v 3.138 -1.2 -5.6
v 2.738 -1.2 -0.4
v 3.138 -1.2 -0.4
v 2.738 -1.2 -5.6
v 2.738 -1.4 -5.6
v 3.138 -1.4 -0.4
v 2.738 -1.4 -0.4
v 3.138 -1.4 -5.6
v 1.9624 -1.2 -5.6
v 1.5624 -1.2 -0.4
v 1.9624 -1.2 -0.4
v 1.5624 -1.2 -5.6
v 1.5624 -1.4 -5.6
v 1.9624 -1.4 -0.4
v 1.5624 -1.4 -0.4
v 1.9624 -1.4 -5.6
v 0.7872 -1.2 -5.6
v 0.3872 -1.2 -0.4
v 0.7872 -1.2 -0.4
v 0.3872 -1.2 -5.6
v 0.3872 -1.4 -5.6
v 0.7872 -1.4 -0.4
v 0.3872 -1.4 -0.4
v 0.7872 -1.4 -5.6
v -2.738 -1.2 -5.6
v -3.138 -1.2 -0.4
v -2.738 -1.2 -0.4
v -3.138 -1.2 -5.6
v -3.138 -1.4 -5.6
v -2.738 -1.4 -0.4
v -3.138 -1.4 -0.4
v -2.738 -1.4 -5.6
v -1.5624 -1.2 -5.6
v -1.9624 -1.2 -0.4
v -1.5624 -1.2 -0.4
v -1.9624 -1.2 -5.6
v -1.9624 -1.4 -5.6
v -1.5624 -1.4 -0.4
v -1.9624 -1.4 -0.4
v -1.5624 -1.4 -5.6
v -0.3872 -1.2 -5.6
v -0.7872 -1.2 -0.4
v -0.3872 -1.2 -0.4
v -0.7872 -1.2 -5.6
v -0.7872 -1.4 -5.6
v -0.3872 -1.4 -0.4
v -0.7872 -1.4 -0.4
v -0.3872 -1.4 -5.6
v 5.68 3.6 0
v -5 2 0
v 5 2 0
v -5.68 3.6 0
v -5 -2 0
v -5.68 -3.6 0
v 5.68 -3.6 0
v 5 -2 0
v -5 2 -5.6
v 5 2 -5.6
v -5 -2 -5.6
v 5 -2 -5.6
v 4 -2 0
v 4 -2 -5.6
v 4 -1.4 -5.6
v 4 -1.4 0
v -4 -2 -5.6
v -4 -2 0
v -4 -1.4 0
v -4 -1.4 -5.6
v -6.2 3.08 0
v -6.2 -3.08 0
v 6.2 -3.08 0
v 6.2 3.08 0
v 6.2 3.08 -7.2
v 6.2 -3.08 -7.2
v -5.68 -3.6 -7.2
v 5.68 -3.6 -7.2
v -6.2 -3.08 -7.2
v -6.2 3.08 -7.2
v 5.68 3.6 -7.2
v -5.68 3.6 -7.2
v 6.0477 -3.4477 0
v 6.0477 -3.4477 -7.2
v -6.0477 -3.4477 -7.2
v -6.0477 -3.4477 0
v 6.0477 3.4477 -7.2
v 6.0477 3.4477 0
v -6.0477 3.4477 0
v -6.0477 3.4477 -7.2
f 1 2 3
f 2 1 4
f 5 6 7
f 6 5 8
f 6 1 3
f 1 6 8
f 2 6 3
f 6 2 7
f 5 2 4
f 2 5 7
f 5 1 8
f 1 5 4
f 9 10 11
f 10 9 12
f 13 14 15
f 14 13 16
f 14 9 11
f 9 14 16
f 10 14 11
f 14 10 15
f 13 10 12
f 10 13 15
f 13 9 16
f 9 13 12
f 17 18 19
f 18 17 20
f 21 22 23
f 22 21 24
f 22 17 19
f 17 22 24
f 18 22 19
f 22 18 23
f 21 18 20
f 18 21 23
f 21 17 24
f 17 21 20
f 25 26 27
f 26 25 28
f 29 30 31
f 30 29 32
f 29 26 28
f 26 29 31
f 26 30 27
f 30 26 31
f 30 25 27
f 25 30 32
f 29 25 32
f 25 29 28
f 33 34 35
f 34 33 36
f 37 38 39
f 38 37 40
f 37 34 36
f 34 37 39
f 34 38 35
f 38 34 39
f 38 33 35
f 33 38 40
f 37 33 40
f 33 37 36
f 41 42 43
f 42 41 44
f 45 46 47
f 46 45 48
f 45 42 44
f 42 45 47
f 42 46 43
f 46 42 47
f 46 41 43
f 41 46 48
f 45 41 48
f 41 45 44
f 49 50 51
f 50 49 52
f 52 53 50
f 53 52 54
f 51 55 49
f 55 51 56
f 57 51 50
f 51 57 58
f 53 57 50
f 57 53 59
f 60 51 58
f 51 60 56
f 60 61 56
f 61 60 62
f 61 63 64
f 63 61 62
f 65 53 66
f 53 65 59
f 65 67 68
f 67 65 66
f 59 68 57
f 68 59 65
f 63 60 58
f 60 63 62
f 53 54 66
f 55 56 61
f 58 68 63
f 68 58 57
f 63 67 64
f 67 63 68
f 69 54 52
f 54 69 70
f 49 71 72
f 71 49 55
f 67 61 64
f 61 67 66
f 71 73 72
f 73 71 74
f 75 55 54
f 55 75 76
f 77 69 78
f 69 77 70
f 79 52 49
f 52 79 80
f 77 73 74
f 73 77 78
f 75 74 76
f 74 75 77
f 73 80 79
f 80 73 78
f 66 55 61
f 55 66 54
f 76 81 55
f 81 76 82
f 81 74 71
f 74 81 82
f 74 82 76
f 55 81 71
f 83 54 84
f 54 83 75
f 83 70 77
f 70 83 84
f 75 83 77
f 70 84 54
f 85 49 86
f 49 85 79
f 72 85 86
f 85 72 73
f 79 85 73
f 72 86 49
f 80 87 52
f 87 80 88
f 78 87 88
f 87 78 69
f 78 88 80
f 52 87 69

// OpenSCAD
// file: ../p/8/1-4edge.scad
use <../../lib.scad>
function ldraw_lib__8__1_4edge() = [
// 0 Circle 0.25
// 0 Name: 8\1-4edge.dat
// 0 Author: Philippe Hurbain [Philo]
// 0 !LDRAW_ORG 8_Primitive UPDATE 2016-01
// 0 !LICENSE Licensed under CC BY 4.0 : see CAreadme.txt
// 
// 0 BFC CERTIFY CCW
  [0,"BFC","CERTIFY"],
  [0,"BFC","CCW"],
// 
// 0 !HISTORY 2016-12-31 [PTadmin] Official Update 2016-01
// 
// 
// 2 24 1 0 0 0.7071 0 0.7071
  [2,24,1,0,0,0.7071,0,0.7071],
// 2 24 0.7071 0 0.7071 0 0 1
  [2,24,0.7071,0,0.7071,0,0,1],
// 0 // Build by Primitive Generator 2
];
module ldraw_lib__8__1_4edge(step=0, col=false, unit=2/5, alt=false, line=0.2, solid=!$preview)
    makepoly(ldraw_lib__8__1_4edge(), step=step, col=col, unit=unit, alt=alt, line=line, solid=solid);
ldraw_lib__8__1_4edge(line=0.2);
// file: ../p/8/1-4cyli.scad
use <../../lib.scad>
function ldraw_lib__8__1_4cyli() = [
// 0 Cylinder 0.25
// 0 Name: 8\1-4cyli.dat
// 0 Author: Philippe Hurbain [Philo]
// 0 !LDRAW_ORG 8_Primitive UPDATE 2016-01
// 0 !LICENSE Licensed under CC BY 4.0 : see CAreadme.txt
// 
// 0 BFC CERTIFY CCW
  [0,"BFC","CERTIFY"],
  [0,"BFC","CCW"],
// 
// 0 !HISTORY 2016-12-31 [PTadmin] Official Update 2016-01
// 
// 
// 4 16 0.7071 0 0.7071 1 0 0 1 1 0 0.7071 1 0.7071
  [4,16,0.7071,0,0.7071,1,0,0,1,1,0,0.7071,1,0.7071],
// 4 16 0 0 1 0.7071 0 0.7071 0.7071 1 0.7071 0 1 1
  [4,16,0,0,1,0.7071,0,0.7071,0.7071,1,0.7071,0,1,1],
// 0 // conditional lines
// 5 24 1 1 0 1 0 0 1 1 -1 0.7071 1 0.7071
  [5,24,1,1,0,1,0,0,1,1,-1,0.7071,1,0.7071],
// 5 24 0.7071 1 0.7071 0.7071 0 0.7071 1 1 0 0 1 1
  [5,24,0.7071,1,0.7071,0.7071,0,0.7071,1,1,0,0,1,1],
// 5 24 0 1 1 0 0 1 0.7071 1 0.7071 -1 1 1
  [5,24,0,1,1,0,0,1,0.7071,1,0.7071,-1,1,1],
// 0 // Build by Primitive Generator 2
];
module ldraw_lib__8__1_4cyli(step=0, col=false, unit=2/5, alt=false, line=0.2, solid=!$preview)
    makepoly(ldraw_lib__8__1_4cyli(), step=step, col=col, unit=unit, alt=alt, line=line, solid=solid);
ldraw_lib__8__1_4cyli(line=0.2);
// file: ../p/rect2p.scad
use <../lib.scad>
function ldraw_lib__rect2p() = [
// 0 Rectangle with 2 Parallel Edges
// 0 Name: rect2p.dat
// 0 Author: Donald Sutter [technog]
// 0 !LDRAW_ORG Primitive UPDATE 2010-01
// 0 !LICENSE Licensed under CC BY 4.0 : see CAreadme.txt
// 
// 0 BFC CERTIFY CCW
  [0,"BFC","CERTIFY"],
  [0,"BFC","CCW"],
// 
// 0 !HISTORY 2003-08-01 [PTadmin] Official Update 2003-02
// 0 !HISTORY 2007-06-24 [PTadmin] Header formatted for Contributor Agreement
// 0 !HISTORY 2008-07-01 [PTadmin] Official Update 2008-01
// 0 !HISTORY 2010-01-17 [mikeheide] changed winding to CCW
// 0 !HISTORY 2010-04-05 [PTadmin] Official Update 2010-01
// 
// 
// 2 24 1 0 1 -1 0 1
  [2,24,1,0,1,-1,0,1],
// 2 24 -1 0 -1 1 0 -1
  [2,24,-1,0,-1,1,0,-1],
// 4 16 -1 0 1 -1 0 -1 1 0 -1 1 0 1
  [4,16,-1,0,1,-1,0,-1,1,0,-1,1,0,1],
// 0
];
module ldraw_lib__rect2p(step=0, col=false, unit=2/5, alt=false, line=0.2, solid=!$preview)
    makepoly(ldraw_lib__rect2p(), step=step, col=col, unit=unit, alt=alt, line=line, solid=solid);
ldraw_lib__rect2p(line=0.2);
// file: ../p/box3u2p.scad
use <../lib.scad>
function ldraw_lib__box3u2p() = [
// 0 Box with 3 Faces without 2 Parallel Edges
// 0 Name: box3u2p.dat
// 0 Author: Niels Karsdorp [nielsk]
// 0 !LDRAW_ORG Primitive UPDATE 2012-01
// 0 !LICENSE Licensed under CC BY 4.0 : see CAreadme.txt
// 
// 0 BFC CERTIFY CCW
  [0,"BFC","CERTIFY"],
  [0,"BFC","CCW"],
// 
// 0 !HISTORY 2003-03-12 [PTadmin] Official Update 2003-01
// 0 !HISTORY 2007-06-24 [PTadmin] Header formatted for Contributor Agreement
// 0 !HISTORY 2008-07-01 [PTadmin] Official Update 2008-01
// 0 !HISTORY 2012-02-16 [Philo] Changed to CCW
// 0 !HISTORY 2012-03-30 [PTadmin] Official Update 2012-01
// 
// 
// 2 24 1 1 1 -1 1 1
  [2,24,1,1,1,-1,1,1],
// 2 24 -1 1 -1 1 1 -1
  [2,24,-1,1,-1,1,1,-1],
// 2 24 1 0 1 -1 0 1
  [2,24,1,0,1,-1,0,1],
// 2 24 -1 0 -1 1 0 -1
  [2,24,-1,0,-1,1,0,-1],
// 2 24 1 1 1 1 1 -1
  [2,24,1,1,1,1,1,-1],
// 2 24 -1 1 1 -1 1 -1
  [2,24,-1,1,1,-1,1,-1],
// 2 24 1 1 1 1 0 1
  [2,24,1,1,1,1,0,1],
// 2 24 1 1 -1 1 0 -1
  [2,24,1,1,-1,1,0,-1],
// 2 24 -1 1 1 -1 0 1
  [2,24,-1,1,1,-1,0,1],
// 2 24 -1 1 -1 -1 0 -1
  [2,24,-1,1,-1,-1,0,-1],
// 4 16 -1 1 -1 -1 1 1 1 1 1 1 1 -1
  [4,16,-1,1,-1,-1,1,1,1,1,1,1,1,-1],
// 4 16 -1 1 1 -1 0 1 1 0 1 1 1 1
  [4,16,-1,1,1,-1,0,1,1,0,1,1,1,1],
// 4 16 1 1 -1 1 0 -1 -1 0 -1 -1 1 -1
  [4,16,1,1,-1,1,0,-1,-1,0,-1,-1,1,-1],
];
module ldraw_lib__box3u2p(step=0, col=false, unit=2/5, alt=false, line=0.2, solid=!$preview)
    makepoly(ldraw_lib__box3u2p(), step=step, col=col, unit=unit, alt=alt, line=line, solid=solid);
ldraw_lib__box3u2p(line=0.2);
// file: ../p/box2-5.scad
use <../lib.scad>
function ldraw_lib__box2_5() = [
// 0 Box with 2 Faces without 5 Edges
// 0 Name: box2-5.dat
// 0 Author: Steffen [Steffen]
// 0 !LDRAW_ORG Primitive UPDATE 2003-03
// 0 !LICENSE Licensed under CC BY 4.0 : see CAreadme.txt
// 
// 0 BFC CERTIFY CCW
  [0,"BFC","CERTIFY"],
  [0,"BFC","CCW"],
// 
// 0 !HISTORY 2003-12-19 [PTadmin] Official Update 2003-03
// 0 !HISTORY 2007-06-24 [PTadmin] Header formatted for Contributor Agreement
// 0 !HISTORY 2008-07-01 [PTadmin] Official Update 2008-01
// 
// 
// 2 24 1 1 1 -1 1 1
  [2,24,1,1,1,-1,1,1],
// 2 24 1 1 -1 -1 1 -1
  [2,24,1,1,-1,-1,1,-1],
// 2 24 1 -1 1 -1 -1 1
  [2,24,1,-1,1,-1,-1,1],
// 2 24 -1 -1 1 -1 1 1
  [2,24,-1,-1,1,-1,1,1],
// 2 24 1 -1 1 1 1 1
  [2,24,1,-1,1,1,1,1],
// 2 24 -1 1 -1 -1 1 1
  [2,24,-1,1,-1,-1,1,1],
// 2 24 1 1 -1 1 1 1
  [2,24,1,1,-1,1,1,1],
// 4 16 1 1 1 1 1 -1 -1 1 -1 -1 1 1
  [4,16,1,1,1,1,1,-1,-1,1,-1,-1,1,1],
// 4 16 1 1 1 -1 1 1 -1 -1 1 1 -1 1
  [4,16,1,1,1,-1,1,1,-1,-1,1,1,-1,1],
// 0
];
module ldraw_lib__box2_5(step=0, col=false, unit=2/5, alt=false, line=0.2, solid=!$preview)
    makepoly(ldraw_lib__box2_5(), step=step, col=col, unit=unit, alt=alt, line=line, solid=solid);
ldraw_lib__box2_5(line=0.2);
// file: ../p/box.scad
use <../lib.scad>
function ldraw_lib__box() = [
// 0 Box 6 (six faces)
// 0 Name: box.dat
// 0 Author: James Jessiman
// 0 !LDRAW_ORG Primitive UPDATE 2002-05
// 0 !LICENSE Licensed under CC BY 4.0 : see CAreadme.txt
// 
// 0 BFC CERTIFY CCW
  [0,"BFC","CERTIFY"],
  [0,"BFC","CCW"],
// 
// 0 !HISTORY 2002-08-22 [sbliss] Applied BFC
// 0 !HISTORY 2002-11-30 [PTadmin] Official Update 2002-05
// 0 !HISTORY 2007-06-24 [PTadmin] Header formatted for Contributor Agreement
// 0 !HISTORY 2008-07-01 [PTadmin] Official Update 2008-01
// 
// 
// 2 24 1 1 1 -1 1 1
  [2,24,1,1,1,-1,1,1],
// 2 24 -1 1 1 -1 1 -1
  [2,24,-1,1,1,-1,1,-1],
// 2 24 -1 1 -1 1 1 -1
  [2,24,-1,1,-1,1,1,-1],
// 2 24 1 1 -1 1 1 1
  [2,24,1,1,-1,1,1,1],
// 2 24 1 -1 1 -1 -1 1
  [2,24,1,-1,1,-1,-1,1],
// 2 24 -1 -1 1 -1 -1 -1
  [2,24,-1,-1,1,-1,-1,-1],
// 2 24 -1 -1 -1 1 -1 -1
  [2,24,-1,-1,-1,1,-1,-1],
// 2 24 1 -1 -1 1 -1 1
  [2,24,1,-1,-1,1,-1,1],
// 2 24 1 -1 1 1 1 1
  [2,24,1,-1,1,1,1,1],
// 2 24 -1 -1 1 -1 1 1
  [2,24,-1,-1,1,-1,1,1],
// 2 24 1 -1 -1 1 1 -1
  [2,24,1,-1,-1,1,1,-1],
// 2 24 -1 -1 -1 -1 1 -1
  [2,24,-1,-1,-1,-1,1,-1],
// 4 16 1 1 1 1 1 -1 -1 1 -1 -1 1 1
  [4,16,1,1,1,1,1,-1,-1,1,-1,-1,1,1],
// 4 16 -1 -1 -1 1 -1 -1 1 -1 1 -1 -1 1
  [4,16,-1,-1,-1,1,-1,-1,1,-1,1,-1,-1,1],
// 4 16 -1 -1 1 1 -1 1 1 1 1 -1 1 1
  [4,16,-1,-1,1,1,-1,1,1,1,1,-1,1,1],
// 4 16 -1 -1 -1 -1 -1 1 -1 1 1 -1 1 -1
  [4,16,-1,-1,-1,-1,-1,1,-1,1,1,-1,1,-1],
// 4 16 1 -1 -1 -1 -1 -1 -1 1 -1 1 1 -1
  [4,16,1,-1,-1,-1,-1,-1,-1,1,-1,1,1,-1],
// 4 16 1 -1 1 1 -1 -1 1 1 -1 1 1 1
  [4,16,1,-1,1,1,-1,-1,1,1,-1,1,1,1],
// 0
];
module ldraw_lib__box(step=0, col=false, unit=2/5, alt=false, line=0.2, solid=!$preview)
    makepoly(ldraw_lib__box(), step=step, col=col, unit=unit, alt=alt, line=line, solid=solid);
ldraw_lib__box(line=0.2);
// file: ../p/8/1-4cylo.scad
use <../../lib.scad>
use <1-4cyli.scad>
use <1-4edge.scad>
function ldraw_lib__8__1_4cylo() = [
// 0 Lo-Res Cylinder Open 0.25
// 0 Name: 8\1-4cylo.dat
// 0 Author: Magnus Forsberg [MagFors]
// 0 !LDRAW_ORG 8_Primitive UPDATE 2018-02
// 0 !LICENSE Licensed under CC BY 4.0 : see CAreadme.txt
// 
// 0 BFC CERTIFY CCW
  [0,"BFC","CERTIFY"],
  [0,"BFC","CCW"],
// 
// 0 !HISTORY 2018-12-08 [PTadmin] Official Update 2018-02
// 
// 
// 1 16 0 0 0 1 0 0 0 1 0 0 0 1 8\1-4edge.dat
  [1,16,0,0,0,1,0,0,0,1,0,0,0,1, ldraw_lib__8__1_4edge()],
// 1 16 0 0 0 1 0 0 0 1 0 0 0 1 8\1-4cyli.dat
  [1,16,0,0,0,1,0,0,0,1,0,0,0,1, ldraw_lib__8__1_4cyli()],
// 1 16 0 1 0 1 0 0 0 1 0 0 0 1 8\1-4edge.dat
  [1,16,0,1,0,1,0,0,0,1,0,0,0,1, ldraw_lib__8__1_4edge()],
];
module ldraw_lib__8__1_4cylo(step=0, col=false, unit=2/5, alt=false, line=0.2, solid=!$preview)
    makepoly(ldraw_lib__8__1_4cylo(), step=step, col=col, unit=unit, alt=alt, line=line, solid=solid);
ldraw_lib__8__1_4cylo(line=0.2);
// file: ../p/8/1-4chrd.scad
use <../../lib.scad>
function ldraw_lib__8__1_4chrd() = [
// 0 Lo-Res Chord 0.25
// 0 Name: 8\1-4chrd.dat
// 0 Author: Magnus Forsberg [MagFors]
// 0 !LDRAW_ORG 8_Primitive UPDATE 2018-02
// 0 !LICENSE Licensed under CC BY 4.0 : see CAreadme.txt
// 
// 0 BFC CERTIFY CCW
  [0,"BFC","CERTIFY"],
  [0,"BFC","CCW"],
// 
// 0 !HISTORY 2018-12-08 [PTadmin] Official Update 2018-02
// 
// 
// 3 16 1 0 0 0.7071 0 0.7071 0 0 1
  [3,16,1,0,0,0.7071,0,0.7071,0,0,1],
// 0 // Build by Primitive Generator 2
];
module ldraw_lib__8__1_4chrd(step=0, col=false, unit=2/5, alt=false, line=0.2, solid=!$preview)
    makepoly(ldraw_lib__8__1_4chrd(), step=step, col=col, unit=unit, alt=alt, line=line, solid=solid);
ldraw_lib__8__1_4chrd(line=0.2);
// main file
use <../lib.scad>
use <../p/8/1-4chrd.scad>
use <../p/8/1-4cylo.scad>
use <../p/box.scad>
use <../p/box2-5.scad>
use <../p/box3u2p.scad>
use <../p/rect2p.scad>
function ldraw_lib__t1117() = [
// 0 ~| BuWizz Electric Powered Up Vertical Socket
// 0 Name: t1117.dat
// 0 Author: Philippe Hurbain [Philo]
// 0 !LDRAW_ORG Part UPDATE 2025-02
// 0 !LICENSE Licensed under CC BY 4.0 : see CAreadme.txt
// 
// 0 BFC CERTIFY CCW
  [0,"BFC","CERTIFY"],
  [0,"BFC","CCW"],
// 
// 0 !CATEGORY Electric
// 
// 0 !HISTORY 2025-02-27 [OrionP] Official Update 2025-02
// 
// 
// 1 334 7.345 7.5 -3.25 0 0 .5 6.5 0 0 0 .25 0 box.dat
  [1,334,7.345,7.5,-3.25,0,0,.5,6.5,0,0,0,.25,0, ldraw_lib__box()],
// 1 334 4.406 7.5 -3.25 0 0 .5 6.5 0 0 0 .25 0 box.dat
  [1,334,4.406,7.5,-3.25,0,0,.5,6.5,0,0,0,.25,0, ldraw_lib__box()],
// 1 334 1.468 7.5 -3.25 0 0 .5 6.5 0 0 0 .25 0 box.dat
  [1,334,1.468,7.5,-3.25,0,0,.5,6.5,0,0,0,.25,0, ldraw_lib__box()],
// 1 334 -7.345 7.5 -3.25 0 0 -.5 6.5 0 0 0 .25 0 box.dat
  [1,334,-7.345,7.5,-3.25,0,0,-.5,6.5,0,0,0,.25,0, ldraw_lib__box()],
// 1 334 -4.406 7.5 -3.25 0 0 -.5 6.5 0 0 0 .25 0 box.dat
  [1,334,-4.406,7.5,-3.25,0,0,-.5,6.5,0,0,0,.25,0, ldraw_lib__box()],
// 1 334 -1.468 7.5 -3.25 0 0 -.5 6.5 0 0 0 .25 0 box.dat
  [1,334,-1.468,7.5,-3.25,0,0,-.5,6.5,0,0,0,.25,0, ldraw_lib__box()],
// 2 24 12.5 0 5 12.5 0 -5
  [2,24,12.5,0,5,12.5,0,-5],
// 2 24 -12.5 0 5 -12.5 0 -5
  [2,24,-12.5,0,5,-12.5,0,-5],
// 2 24 12.5 0 5 -12.5 0 5
  [2,24,12.5,0,5,-12.5,0,5],
// 2 24 12.5 0 -5 10 0 -5
  [2,24,12.5,0,-5,10,0,-5],
// 2 24 -12.5 0 -5 -10 0 -5
  [2,24,-12.5,0,-5,-10,0,-5],
// 4 16 -12.5 0 5 12.5 0 5 14.2 0 9 -14.2 0 9
  [4,16,-12.5,0,5,12.5,0,5,14.2,0,9,-14.2,0,9],
// 4 16 -14.2 0 9 -14.2 0 -9 -12.5 0 -5 -12.5 0 5
  [4,16,-14.2,0,9,-14.2,0,-9,-12.5,0,-5,-12.5,0,5],
// 4 16 14.2 0 9 12.5 0 5 12.5 0 -5 14.2 0 -9
  [4,16,14.2,0,9,12.5,0,5,12.5,0,-5,14.2,0,-9],
// 2 24 12.5 14 5 12.5 14 -5
  [2,24,12.5,14,5,12.5,14,-5],
// 2 24 -12.5 14 5 -12.5 14 -5
  [2,24,-12.5,14,5,-12.5,14,-5],
// 2 24 12.5 14 5 -12.5 14 5
  [2,24,12.5,14,5,-12.5,14,5],
// 2 24 12.5 14 -5 10 14 -5
  [2,24,12.5,14,-5,10,14,-5],
// 2 24 10 14 -5 10 14 -3.5
  [2,24,10,14,-5,10,14,-3.5],
// 2 24 -12.5 14 -5 -10 14 -5
  [2,24,-12.5,14,-5,-10,14,-5],
// 2 24 -10 14 -5 -10 14 -3.5
  [2,24,-10,14,-5,-10,14,-3.5],
// 0 BFC INVERTNEXT
  [0,"BFC","INVERTNEXT"],
// 1 16 0 7 -5 0 0 -12.5 7 0 0 0 10 0 box3u2p.dat
  [1,16,0,7,-5,0,0,-12.5,7,0,0,0,10,0, ldraw_lib__box3u2p()],
// 0 BFC INVERTNEXT
  [0,"BFC","INVERTNEXT"],
// 1 16 11.25 7 -4.25 0 0 -1.25 -7 0 0 0 -.75 0 box2-5.dat
  [1,16,11.25,7,-4.25,0,0,-1.25,-7,0,0,0,-.75,0, ldraw_lib__box2_5()],
// 0 BFC INVERTNEXT
  [0,"BFC","INVERTNEXT"],
// 1 16 -11.25 7 -4.25 0 0 1.25 -7 0 0 0 -.75 0 box2-5.dat
  [1,16,-11.25,7,-4.25,0,0,1.25,-7,0,0,0,-.75,0, ldraw_lib__box2_5()],
// 4 16 -10 14 -5 -10 14 -3.5 -12.5 14 5 -12.5 14 -5
  [4,16,-10,14,-5,-10,14,-3.5,-12.5,14,5,-12.5,14,-5],
// 4 16 12.5 14 -5 12.5 14 5 10 14 -3.5 10 14 -5
  [4,16,12.5,14,-5,12.5,14,5,10,14,-3.5,10,14,-5],
// 3 16 -12.5 0 -5 -14.2 0 -9 -10 0 -5
  [3,16,-12.5,0,-5,-14.2,0,-9,-10,0,-5],
// 3 16 14.2 0 -9 12.5 0 -5 10 0 -5
  [3,16,14.2,0,-9,12.5,0,-5,10,0,-5],
// 4 16 10 14 -3.5 12.5 14 5 -12.5 14 5 -10 14 -3.5
  [4,16,10,14,-3.5,12.5,14,5,-12.5,14,5,-10,14,-3.5],
// 1 16 0 7 -3.5 -10 0 0 0 0 -7 0 -1 0 rect2p.dat
  [1,16,0,7,-3.5,-10,0,0,0,0,-7,0,-1,0, ldraw_lib__rect2p()],
// 4 16 -14.2 0 -9 -14.2 0 9 -15.5 0 7.7 -15.5 0 -7.7
  [4,16,-14.2,0,-9,-14.2,0,9,-15.5,0,7.7,-15.5,0,-7.7],
// 4 16 14.2 0 9 14.2 0 -9 15.5 0 -7.7 15.5 0 7.7
  [4,16,14.2,0,9,14.2,0,-9,15.5,0,-7.7,15.5,0,7.7],
// 1 16 0 0 -4.25 0 0 -10 0 1 0 0.75 0 0 rect2p.dat
  [1,16,0,0,-4.25,0,0,-10,0,1,0,0.75,0,0, ldraw_lib__rect2p()],
// 1 16 15.5 9 0 0 -1 0 0 0 -9 7.7 0 0 rect2p.dat
  [1,16,15.5,9,0,0,-1,0,0,0,-9,7.7,0,0, ldraw_lib__rect2p()],
// 1 16 0 9 -9 14.2 0 0 0 0 -9 0 1 0 rect2p.dat
  [1,16,0,9,-9,14.2,0,0,0,0,-9,0,1,0, ldraw_lib__rect2p()],
// 1 16 -15.5 9 0 0 1 0 0 0 9 7.7 0 0 rect2p.dat
  [1,16,-15.5,9,0,0,1,0,0,0,9,7.7,0,0, ldraw_lib__rect2p()],
// 1 16 0 9 9 -14.2 0 0 0 0 -9 0 -1 0 rect2p.dat
  [1,16,0,9,9,-14.2,0,0,0,0,-9,0,-1,0, ldraw_lib__rect2p()],
// 4 16 15.5 18 -7.7 -15.5 18 -7.7 -15.5 18 7.7 15.5 18 7.7
  [4,16,15.5,18,-7.7,-15.5,18,-7.7,-15.5,18,7.7,15.5,18,7.7],
// 4 16 -15.5 18 -7.7 15.5 18 -7.7 14.2 18 -9 -14.2 18 -9
  [4,16,-15.5,18,-7.7,15.5,18,-7.7,14.2,18,-9,-14.2,18,-9],
// 4 16 15.5 18 7.7 -15.5 18 7.7 -14.2 18 9 14.2 18 9
  [4,16,15.5,18,7.7,-15.5,18,7.7,-14.2,18,9,14.2,18,9],
// 4 16 14.2 0 -9 10 0 -5 -10 0 -5 -14.2 0 -9
  [4,16,14.2,0,-9,10,0,-5,-10,0,-5,-14.2,0,-9],
// 1 16 14.2 0 -7.7 0 0 1.3 0 18 0 -1.3 0 0 8\1-4cylo.dat
  [1,16,14.2,0,-7.7,0,0,1.3,0,18,0,-1.3,0,0, ldraw_lib__8__1_4cylo()],
// 1 16 14.2 18 -7.7 0 0 1.3 0 -1 0 -1.3 0 0 8\1-4chrd.dat
  [1,16,14.2,18,-7.7,0,0,1.3,0,-1,0,-1.3,0,0, ldraw_lib__8__1_4chrd()],
// 1 16 14.2 0 -7.7 0 0 1.3 0 1 0 -1.3 0 0 8\1-4chrd.dat
  [1,16,14.2,0,-7.7,0,0,1.3,0,1,0,-1.3,0,0, ldraw_lib__8__1_4chrd()],
// 1 16 -14.2 0 -7.7 0 0 -1.3 0 18 0 -1.3 0 0 8\1-4cylo.dat
  [1,16,-14.2,0,-7.7,0,0,-1.3,0,18,0,-1.3,0,0, ldraw_lib__8__1_4cylo()],
// 1 16 -14.2 18 -7.7 0 0 -1.3 0 -1 0 -1.3 0 0 8\1-4chrd.dat
  [1,16,-14.2,18,-7.7,0,0,-1.3,0,-1,0,-1.3,0,0, ldraw_lib__8__1_4chrd()],
// 1 16 -14.2 0 -7.7 0 0 -1.3 0 1 0 -1.3 0 0 8\1-4chrd.dat
  [1,16,-14.2,0,-7.7,0,0,-1.3,0,1,0,-1.3,0,0, ldraw_lib__8__1_4chrd()],
// 1 16 14.2 0 7.7 0 0 1.3 0 18 0 1.3 0 0 8\1-4cylo.dat
  [1,16,14.2,0,7.7,0,0,1.3,0,18,0,1.3,0,0, ldraw_lib__8__1_4cylo()],
// 1 16 14.2 18 7.7 0 0 1.3 0 -1 0 1.3 0 0 8\1-4chrd.dat
  [1,16,14.2,18,7.7,0,0,1.3,0,-1,0,1.3,0,0, ldraw_lib__8__1_4chrd()],
// 1 16 14.2 0 7.7 0 0 1.3 0 1 0 1.3 0 0 8\1-4chrd.dat
  [1,16,14.2,0,7.7,0,0,1.3,0,1,0,1.3,0,0, ldraw_lib__8__1_4chrd()],
// 1 16 -14.2 0 7.7 0 0 -1.3 0 18 0 1.3 0 0 8\1-4cylo.dat
  [1,16,-14.2,0,7.7,0,0,-1.3,0,18,0,1.3,0,0, ldraw_lib__8__1_4cylo()],
// 1 16 -14.2 18 7.7 0 0 -1.3 0 -1 0 1.3 0 0 8\1-4chrd.dat
  [1,16,-14.2,18,7.7,0,0,-1.3,0,-1,0,1.3,0,0, ldraw_lib__8__1_4chrd()],
// 1 16 -14.2 0 7.7 0 0 -1.3 0 1 0 1.3 0 0 8\1-4chrd.dat
  [1,16,-14.2,0,7.7,0,0,-1.3,0,1,0,1.3,0,0, ldraw_lib__8__1_4chrd()],
];
module ldraw_lib__t1117(step=0, col=false, unit=2/5, alt=false, line=0.2, solid=!$preview)
    makepoly(ldraw_lib__t1117(), step=step, col=col, unit=unit, alt=alt, line=line, solid=solid);
ldraw_lib__t1117(line=0.2);
